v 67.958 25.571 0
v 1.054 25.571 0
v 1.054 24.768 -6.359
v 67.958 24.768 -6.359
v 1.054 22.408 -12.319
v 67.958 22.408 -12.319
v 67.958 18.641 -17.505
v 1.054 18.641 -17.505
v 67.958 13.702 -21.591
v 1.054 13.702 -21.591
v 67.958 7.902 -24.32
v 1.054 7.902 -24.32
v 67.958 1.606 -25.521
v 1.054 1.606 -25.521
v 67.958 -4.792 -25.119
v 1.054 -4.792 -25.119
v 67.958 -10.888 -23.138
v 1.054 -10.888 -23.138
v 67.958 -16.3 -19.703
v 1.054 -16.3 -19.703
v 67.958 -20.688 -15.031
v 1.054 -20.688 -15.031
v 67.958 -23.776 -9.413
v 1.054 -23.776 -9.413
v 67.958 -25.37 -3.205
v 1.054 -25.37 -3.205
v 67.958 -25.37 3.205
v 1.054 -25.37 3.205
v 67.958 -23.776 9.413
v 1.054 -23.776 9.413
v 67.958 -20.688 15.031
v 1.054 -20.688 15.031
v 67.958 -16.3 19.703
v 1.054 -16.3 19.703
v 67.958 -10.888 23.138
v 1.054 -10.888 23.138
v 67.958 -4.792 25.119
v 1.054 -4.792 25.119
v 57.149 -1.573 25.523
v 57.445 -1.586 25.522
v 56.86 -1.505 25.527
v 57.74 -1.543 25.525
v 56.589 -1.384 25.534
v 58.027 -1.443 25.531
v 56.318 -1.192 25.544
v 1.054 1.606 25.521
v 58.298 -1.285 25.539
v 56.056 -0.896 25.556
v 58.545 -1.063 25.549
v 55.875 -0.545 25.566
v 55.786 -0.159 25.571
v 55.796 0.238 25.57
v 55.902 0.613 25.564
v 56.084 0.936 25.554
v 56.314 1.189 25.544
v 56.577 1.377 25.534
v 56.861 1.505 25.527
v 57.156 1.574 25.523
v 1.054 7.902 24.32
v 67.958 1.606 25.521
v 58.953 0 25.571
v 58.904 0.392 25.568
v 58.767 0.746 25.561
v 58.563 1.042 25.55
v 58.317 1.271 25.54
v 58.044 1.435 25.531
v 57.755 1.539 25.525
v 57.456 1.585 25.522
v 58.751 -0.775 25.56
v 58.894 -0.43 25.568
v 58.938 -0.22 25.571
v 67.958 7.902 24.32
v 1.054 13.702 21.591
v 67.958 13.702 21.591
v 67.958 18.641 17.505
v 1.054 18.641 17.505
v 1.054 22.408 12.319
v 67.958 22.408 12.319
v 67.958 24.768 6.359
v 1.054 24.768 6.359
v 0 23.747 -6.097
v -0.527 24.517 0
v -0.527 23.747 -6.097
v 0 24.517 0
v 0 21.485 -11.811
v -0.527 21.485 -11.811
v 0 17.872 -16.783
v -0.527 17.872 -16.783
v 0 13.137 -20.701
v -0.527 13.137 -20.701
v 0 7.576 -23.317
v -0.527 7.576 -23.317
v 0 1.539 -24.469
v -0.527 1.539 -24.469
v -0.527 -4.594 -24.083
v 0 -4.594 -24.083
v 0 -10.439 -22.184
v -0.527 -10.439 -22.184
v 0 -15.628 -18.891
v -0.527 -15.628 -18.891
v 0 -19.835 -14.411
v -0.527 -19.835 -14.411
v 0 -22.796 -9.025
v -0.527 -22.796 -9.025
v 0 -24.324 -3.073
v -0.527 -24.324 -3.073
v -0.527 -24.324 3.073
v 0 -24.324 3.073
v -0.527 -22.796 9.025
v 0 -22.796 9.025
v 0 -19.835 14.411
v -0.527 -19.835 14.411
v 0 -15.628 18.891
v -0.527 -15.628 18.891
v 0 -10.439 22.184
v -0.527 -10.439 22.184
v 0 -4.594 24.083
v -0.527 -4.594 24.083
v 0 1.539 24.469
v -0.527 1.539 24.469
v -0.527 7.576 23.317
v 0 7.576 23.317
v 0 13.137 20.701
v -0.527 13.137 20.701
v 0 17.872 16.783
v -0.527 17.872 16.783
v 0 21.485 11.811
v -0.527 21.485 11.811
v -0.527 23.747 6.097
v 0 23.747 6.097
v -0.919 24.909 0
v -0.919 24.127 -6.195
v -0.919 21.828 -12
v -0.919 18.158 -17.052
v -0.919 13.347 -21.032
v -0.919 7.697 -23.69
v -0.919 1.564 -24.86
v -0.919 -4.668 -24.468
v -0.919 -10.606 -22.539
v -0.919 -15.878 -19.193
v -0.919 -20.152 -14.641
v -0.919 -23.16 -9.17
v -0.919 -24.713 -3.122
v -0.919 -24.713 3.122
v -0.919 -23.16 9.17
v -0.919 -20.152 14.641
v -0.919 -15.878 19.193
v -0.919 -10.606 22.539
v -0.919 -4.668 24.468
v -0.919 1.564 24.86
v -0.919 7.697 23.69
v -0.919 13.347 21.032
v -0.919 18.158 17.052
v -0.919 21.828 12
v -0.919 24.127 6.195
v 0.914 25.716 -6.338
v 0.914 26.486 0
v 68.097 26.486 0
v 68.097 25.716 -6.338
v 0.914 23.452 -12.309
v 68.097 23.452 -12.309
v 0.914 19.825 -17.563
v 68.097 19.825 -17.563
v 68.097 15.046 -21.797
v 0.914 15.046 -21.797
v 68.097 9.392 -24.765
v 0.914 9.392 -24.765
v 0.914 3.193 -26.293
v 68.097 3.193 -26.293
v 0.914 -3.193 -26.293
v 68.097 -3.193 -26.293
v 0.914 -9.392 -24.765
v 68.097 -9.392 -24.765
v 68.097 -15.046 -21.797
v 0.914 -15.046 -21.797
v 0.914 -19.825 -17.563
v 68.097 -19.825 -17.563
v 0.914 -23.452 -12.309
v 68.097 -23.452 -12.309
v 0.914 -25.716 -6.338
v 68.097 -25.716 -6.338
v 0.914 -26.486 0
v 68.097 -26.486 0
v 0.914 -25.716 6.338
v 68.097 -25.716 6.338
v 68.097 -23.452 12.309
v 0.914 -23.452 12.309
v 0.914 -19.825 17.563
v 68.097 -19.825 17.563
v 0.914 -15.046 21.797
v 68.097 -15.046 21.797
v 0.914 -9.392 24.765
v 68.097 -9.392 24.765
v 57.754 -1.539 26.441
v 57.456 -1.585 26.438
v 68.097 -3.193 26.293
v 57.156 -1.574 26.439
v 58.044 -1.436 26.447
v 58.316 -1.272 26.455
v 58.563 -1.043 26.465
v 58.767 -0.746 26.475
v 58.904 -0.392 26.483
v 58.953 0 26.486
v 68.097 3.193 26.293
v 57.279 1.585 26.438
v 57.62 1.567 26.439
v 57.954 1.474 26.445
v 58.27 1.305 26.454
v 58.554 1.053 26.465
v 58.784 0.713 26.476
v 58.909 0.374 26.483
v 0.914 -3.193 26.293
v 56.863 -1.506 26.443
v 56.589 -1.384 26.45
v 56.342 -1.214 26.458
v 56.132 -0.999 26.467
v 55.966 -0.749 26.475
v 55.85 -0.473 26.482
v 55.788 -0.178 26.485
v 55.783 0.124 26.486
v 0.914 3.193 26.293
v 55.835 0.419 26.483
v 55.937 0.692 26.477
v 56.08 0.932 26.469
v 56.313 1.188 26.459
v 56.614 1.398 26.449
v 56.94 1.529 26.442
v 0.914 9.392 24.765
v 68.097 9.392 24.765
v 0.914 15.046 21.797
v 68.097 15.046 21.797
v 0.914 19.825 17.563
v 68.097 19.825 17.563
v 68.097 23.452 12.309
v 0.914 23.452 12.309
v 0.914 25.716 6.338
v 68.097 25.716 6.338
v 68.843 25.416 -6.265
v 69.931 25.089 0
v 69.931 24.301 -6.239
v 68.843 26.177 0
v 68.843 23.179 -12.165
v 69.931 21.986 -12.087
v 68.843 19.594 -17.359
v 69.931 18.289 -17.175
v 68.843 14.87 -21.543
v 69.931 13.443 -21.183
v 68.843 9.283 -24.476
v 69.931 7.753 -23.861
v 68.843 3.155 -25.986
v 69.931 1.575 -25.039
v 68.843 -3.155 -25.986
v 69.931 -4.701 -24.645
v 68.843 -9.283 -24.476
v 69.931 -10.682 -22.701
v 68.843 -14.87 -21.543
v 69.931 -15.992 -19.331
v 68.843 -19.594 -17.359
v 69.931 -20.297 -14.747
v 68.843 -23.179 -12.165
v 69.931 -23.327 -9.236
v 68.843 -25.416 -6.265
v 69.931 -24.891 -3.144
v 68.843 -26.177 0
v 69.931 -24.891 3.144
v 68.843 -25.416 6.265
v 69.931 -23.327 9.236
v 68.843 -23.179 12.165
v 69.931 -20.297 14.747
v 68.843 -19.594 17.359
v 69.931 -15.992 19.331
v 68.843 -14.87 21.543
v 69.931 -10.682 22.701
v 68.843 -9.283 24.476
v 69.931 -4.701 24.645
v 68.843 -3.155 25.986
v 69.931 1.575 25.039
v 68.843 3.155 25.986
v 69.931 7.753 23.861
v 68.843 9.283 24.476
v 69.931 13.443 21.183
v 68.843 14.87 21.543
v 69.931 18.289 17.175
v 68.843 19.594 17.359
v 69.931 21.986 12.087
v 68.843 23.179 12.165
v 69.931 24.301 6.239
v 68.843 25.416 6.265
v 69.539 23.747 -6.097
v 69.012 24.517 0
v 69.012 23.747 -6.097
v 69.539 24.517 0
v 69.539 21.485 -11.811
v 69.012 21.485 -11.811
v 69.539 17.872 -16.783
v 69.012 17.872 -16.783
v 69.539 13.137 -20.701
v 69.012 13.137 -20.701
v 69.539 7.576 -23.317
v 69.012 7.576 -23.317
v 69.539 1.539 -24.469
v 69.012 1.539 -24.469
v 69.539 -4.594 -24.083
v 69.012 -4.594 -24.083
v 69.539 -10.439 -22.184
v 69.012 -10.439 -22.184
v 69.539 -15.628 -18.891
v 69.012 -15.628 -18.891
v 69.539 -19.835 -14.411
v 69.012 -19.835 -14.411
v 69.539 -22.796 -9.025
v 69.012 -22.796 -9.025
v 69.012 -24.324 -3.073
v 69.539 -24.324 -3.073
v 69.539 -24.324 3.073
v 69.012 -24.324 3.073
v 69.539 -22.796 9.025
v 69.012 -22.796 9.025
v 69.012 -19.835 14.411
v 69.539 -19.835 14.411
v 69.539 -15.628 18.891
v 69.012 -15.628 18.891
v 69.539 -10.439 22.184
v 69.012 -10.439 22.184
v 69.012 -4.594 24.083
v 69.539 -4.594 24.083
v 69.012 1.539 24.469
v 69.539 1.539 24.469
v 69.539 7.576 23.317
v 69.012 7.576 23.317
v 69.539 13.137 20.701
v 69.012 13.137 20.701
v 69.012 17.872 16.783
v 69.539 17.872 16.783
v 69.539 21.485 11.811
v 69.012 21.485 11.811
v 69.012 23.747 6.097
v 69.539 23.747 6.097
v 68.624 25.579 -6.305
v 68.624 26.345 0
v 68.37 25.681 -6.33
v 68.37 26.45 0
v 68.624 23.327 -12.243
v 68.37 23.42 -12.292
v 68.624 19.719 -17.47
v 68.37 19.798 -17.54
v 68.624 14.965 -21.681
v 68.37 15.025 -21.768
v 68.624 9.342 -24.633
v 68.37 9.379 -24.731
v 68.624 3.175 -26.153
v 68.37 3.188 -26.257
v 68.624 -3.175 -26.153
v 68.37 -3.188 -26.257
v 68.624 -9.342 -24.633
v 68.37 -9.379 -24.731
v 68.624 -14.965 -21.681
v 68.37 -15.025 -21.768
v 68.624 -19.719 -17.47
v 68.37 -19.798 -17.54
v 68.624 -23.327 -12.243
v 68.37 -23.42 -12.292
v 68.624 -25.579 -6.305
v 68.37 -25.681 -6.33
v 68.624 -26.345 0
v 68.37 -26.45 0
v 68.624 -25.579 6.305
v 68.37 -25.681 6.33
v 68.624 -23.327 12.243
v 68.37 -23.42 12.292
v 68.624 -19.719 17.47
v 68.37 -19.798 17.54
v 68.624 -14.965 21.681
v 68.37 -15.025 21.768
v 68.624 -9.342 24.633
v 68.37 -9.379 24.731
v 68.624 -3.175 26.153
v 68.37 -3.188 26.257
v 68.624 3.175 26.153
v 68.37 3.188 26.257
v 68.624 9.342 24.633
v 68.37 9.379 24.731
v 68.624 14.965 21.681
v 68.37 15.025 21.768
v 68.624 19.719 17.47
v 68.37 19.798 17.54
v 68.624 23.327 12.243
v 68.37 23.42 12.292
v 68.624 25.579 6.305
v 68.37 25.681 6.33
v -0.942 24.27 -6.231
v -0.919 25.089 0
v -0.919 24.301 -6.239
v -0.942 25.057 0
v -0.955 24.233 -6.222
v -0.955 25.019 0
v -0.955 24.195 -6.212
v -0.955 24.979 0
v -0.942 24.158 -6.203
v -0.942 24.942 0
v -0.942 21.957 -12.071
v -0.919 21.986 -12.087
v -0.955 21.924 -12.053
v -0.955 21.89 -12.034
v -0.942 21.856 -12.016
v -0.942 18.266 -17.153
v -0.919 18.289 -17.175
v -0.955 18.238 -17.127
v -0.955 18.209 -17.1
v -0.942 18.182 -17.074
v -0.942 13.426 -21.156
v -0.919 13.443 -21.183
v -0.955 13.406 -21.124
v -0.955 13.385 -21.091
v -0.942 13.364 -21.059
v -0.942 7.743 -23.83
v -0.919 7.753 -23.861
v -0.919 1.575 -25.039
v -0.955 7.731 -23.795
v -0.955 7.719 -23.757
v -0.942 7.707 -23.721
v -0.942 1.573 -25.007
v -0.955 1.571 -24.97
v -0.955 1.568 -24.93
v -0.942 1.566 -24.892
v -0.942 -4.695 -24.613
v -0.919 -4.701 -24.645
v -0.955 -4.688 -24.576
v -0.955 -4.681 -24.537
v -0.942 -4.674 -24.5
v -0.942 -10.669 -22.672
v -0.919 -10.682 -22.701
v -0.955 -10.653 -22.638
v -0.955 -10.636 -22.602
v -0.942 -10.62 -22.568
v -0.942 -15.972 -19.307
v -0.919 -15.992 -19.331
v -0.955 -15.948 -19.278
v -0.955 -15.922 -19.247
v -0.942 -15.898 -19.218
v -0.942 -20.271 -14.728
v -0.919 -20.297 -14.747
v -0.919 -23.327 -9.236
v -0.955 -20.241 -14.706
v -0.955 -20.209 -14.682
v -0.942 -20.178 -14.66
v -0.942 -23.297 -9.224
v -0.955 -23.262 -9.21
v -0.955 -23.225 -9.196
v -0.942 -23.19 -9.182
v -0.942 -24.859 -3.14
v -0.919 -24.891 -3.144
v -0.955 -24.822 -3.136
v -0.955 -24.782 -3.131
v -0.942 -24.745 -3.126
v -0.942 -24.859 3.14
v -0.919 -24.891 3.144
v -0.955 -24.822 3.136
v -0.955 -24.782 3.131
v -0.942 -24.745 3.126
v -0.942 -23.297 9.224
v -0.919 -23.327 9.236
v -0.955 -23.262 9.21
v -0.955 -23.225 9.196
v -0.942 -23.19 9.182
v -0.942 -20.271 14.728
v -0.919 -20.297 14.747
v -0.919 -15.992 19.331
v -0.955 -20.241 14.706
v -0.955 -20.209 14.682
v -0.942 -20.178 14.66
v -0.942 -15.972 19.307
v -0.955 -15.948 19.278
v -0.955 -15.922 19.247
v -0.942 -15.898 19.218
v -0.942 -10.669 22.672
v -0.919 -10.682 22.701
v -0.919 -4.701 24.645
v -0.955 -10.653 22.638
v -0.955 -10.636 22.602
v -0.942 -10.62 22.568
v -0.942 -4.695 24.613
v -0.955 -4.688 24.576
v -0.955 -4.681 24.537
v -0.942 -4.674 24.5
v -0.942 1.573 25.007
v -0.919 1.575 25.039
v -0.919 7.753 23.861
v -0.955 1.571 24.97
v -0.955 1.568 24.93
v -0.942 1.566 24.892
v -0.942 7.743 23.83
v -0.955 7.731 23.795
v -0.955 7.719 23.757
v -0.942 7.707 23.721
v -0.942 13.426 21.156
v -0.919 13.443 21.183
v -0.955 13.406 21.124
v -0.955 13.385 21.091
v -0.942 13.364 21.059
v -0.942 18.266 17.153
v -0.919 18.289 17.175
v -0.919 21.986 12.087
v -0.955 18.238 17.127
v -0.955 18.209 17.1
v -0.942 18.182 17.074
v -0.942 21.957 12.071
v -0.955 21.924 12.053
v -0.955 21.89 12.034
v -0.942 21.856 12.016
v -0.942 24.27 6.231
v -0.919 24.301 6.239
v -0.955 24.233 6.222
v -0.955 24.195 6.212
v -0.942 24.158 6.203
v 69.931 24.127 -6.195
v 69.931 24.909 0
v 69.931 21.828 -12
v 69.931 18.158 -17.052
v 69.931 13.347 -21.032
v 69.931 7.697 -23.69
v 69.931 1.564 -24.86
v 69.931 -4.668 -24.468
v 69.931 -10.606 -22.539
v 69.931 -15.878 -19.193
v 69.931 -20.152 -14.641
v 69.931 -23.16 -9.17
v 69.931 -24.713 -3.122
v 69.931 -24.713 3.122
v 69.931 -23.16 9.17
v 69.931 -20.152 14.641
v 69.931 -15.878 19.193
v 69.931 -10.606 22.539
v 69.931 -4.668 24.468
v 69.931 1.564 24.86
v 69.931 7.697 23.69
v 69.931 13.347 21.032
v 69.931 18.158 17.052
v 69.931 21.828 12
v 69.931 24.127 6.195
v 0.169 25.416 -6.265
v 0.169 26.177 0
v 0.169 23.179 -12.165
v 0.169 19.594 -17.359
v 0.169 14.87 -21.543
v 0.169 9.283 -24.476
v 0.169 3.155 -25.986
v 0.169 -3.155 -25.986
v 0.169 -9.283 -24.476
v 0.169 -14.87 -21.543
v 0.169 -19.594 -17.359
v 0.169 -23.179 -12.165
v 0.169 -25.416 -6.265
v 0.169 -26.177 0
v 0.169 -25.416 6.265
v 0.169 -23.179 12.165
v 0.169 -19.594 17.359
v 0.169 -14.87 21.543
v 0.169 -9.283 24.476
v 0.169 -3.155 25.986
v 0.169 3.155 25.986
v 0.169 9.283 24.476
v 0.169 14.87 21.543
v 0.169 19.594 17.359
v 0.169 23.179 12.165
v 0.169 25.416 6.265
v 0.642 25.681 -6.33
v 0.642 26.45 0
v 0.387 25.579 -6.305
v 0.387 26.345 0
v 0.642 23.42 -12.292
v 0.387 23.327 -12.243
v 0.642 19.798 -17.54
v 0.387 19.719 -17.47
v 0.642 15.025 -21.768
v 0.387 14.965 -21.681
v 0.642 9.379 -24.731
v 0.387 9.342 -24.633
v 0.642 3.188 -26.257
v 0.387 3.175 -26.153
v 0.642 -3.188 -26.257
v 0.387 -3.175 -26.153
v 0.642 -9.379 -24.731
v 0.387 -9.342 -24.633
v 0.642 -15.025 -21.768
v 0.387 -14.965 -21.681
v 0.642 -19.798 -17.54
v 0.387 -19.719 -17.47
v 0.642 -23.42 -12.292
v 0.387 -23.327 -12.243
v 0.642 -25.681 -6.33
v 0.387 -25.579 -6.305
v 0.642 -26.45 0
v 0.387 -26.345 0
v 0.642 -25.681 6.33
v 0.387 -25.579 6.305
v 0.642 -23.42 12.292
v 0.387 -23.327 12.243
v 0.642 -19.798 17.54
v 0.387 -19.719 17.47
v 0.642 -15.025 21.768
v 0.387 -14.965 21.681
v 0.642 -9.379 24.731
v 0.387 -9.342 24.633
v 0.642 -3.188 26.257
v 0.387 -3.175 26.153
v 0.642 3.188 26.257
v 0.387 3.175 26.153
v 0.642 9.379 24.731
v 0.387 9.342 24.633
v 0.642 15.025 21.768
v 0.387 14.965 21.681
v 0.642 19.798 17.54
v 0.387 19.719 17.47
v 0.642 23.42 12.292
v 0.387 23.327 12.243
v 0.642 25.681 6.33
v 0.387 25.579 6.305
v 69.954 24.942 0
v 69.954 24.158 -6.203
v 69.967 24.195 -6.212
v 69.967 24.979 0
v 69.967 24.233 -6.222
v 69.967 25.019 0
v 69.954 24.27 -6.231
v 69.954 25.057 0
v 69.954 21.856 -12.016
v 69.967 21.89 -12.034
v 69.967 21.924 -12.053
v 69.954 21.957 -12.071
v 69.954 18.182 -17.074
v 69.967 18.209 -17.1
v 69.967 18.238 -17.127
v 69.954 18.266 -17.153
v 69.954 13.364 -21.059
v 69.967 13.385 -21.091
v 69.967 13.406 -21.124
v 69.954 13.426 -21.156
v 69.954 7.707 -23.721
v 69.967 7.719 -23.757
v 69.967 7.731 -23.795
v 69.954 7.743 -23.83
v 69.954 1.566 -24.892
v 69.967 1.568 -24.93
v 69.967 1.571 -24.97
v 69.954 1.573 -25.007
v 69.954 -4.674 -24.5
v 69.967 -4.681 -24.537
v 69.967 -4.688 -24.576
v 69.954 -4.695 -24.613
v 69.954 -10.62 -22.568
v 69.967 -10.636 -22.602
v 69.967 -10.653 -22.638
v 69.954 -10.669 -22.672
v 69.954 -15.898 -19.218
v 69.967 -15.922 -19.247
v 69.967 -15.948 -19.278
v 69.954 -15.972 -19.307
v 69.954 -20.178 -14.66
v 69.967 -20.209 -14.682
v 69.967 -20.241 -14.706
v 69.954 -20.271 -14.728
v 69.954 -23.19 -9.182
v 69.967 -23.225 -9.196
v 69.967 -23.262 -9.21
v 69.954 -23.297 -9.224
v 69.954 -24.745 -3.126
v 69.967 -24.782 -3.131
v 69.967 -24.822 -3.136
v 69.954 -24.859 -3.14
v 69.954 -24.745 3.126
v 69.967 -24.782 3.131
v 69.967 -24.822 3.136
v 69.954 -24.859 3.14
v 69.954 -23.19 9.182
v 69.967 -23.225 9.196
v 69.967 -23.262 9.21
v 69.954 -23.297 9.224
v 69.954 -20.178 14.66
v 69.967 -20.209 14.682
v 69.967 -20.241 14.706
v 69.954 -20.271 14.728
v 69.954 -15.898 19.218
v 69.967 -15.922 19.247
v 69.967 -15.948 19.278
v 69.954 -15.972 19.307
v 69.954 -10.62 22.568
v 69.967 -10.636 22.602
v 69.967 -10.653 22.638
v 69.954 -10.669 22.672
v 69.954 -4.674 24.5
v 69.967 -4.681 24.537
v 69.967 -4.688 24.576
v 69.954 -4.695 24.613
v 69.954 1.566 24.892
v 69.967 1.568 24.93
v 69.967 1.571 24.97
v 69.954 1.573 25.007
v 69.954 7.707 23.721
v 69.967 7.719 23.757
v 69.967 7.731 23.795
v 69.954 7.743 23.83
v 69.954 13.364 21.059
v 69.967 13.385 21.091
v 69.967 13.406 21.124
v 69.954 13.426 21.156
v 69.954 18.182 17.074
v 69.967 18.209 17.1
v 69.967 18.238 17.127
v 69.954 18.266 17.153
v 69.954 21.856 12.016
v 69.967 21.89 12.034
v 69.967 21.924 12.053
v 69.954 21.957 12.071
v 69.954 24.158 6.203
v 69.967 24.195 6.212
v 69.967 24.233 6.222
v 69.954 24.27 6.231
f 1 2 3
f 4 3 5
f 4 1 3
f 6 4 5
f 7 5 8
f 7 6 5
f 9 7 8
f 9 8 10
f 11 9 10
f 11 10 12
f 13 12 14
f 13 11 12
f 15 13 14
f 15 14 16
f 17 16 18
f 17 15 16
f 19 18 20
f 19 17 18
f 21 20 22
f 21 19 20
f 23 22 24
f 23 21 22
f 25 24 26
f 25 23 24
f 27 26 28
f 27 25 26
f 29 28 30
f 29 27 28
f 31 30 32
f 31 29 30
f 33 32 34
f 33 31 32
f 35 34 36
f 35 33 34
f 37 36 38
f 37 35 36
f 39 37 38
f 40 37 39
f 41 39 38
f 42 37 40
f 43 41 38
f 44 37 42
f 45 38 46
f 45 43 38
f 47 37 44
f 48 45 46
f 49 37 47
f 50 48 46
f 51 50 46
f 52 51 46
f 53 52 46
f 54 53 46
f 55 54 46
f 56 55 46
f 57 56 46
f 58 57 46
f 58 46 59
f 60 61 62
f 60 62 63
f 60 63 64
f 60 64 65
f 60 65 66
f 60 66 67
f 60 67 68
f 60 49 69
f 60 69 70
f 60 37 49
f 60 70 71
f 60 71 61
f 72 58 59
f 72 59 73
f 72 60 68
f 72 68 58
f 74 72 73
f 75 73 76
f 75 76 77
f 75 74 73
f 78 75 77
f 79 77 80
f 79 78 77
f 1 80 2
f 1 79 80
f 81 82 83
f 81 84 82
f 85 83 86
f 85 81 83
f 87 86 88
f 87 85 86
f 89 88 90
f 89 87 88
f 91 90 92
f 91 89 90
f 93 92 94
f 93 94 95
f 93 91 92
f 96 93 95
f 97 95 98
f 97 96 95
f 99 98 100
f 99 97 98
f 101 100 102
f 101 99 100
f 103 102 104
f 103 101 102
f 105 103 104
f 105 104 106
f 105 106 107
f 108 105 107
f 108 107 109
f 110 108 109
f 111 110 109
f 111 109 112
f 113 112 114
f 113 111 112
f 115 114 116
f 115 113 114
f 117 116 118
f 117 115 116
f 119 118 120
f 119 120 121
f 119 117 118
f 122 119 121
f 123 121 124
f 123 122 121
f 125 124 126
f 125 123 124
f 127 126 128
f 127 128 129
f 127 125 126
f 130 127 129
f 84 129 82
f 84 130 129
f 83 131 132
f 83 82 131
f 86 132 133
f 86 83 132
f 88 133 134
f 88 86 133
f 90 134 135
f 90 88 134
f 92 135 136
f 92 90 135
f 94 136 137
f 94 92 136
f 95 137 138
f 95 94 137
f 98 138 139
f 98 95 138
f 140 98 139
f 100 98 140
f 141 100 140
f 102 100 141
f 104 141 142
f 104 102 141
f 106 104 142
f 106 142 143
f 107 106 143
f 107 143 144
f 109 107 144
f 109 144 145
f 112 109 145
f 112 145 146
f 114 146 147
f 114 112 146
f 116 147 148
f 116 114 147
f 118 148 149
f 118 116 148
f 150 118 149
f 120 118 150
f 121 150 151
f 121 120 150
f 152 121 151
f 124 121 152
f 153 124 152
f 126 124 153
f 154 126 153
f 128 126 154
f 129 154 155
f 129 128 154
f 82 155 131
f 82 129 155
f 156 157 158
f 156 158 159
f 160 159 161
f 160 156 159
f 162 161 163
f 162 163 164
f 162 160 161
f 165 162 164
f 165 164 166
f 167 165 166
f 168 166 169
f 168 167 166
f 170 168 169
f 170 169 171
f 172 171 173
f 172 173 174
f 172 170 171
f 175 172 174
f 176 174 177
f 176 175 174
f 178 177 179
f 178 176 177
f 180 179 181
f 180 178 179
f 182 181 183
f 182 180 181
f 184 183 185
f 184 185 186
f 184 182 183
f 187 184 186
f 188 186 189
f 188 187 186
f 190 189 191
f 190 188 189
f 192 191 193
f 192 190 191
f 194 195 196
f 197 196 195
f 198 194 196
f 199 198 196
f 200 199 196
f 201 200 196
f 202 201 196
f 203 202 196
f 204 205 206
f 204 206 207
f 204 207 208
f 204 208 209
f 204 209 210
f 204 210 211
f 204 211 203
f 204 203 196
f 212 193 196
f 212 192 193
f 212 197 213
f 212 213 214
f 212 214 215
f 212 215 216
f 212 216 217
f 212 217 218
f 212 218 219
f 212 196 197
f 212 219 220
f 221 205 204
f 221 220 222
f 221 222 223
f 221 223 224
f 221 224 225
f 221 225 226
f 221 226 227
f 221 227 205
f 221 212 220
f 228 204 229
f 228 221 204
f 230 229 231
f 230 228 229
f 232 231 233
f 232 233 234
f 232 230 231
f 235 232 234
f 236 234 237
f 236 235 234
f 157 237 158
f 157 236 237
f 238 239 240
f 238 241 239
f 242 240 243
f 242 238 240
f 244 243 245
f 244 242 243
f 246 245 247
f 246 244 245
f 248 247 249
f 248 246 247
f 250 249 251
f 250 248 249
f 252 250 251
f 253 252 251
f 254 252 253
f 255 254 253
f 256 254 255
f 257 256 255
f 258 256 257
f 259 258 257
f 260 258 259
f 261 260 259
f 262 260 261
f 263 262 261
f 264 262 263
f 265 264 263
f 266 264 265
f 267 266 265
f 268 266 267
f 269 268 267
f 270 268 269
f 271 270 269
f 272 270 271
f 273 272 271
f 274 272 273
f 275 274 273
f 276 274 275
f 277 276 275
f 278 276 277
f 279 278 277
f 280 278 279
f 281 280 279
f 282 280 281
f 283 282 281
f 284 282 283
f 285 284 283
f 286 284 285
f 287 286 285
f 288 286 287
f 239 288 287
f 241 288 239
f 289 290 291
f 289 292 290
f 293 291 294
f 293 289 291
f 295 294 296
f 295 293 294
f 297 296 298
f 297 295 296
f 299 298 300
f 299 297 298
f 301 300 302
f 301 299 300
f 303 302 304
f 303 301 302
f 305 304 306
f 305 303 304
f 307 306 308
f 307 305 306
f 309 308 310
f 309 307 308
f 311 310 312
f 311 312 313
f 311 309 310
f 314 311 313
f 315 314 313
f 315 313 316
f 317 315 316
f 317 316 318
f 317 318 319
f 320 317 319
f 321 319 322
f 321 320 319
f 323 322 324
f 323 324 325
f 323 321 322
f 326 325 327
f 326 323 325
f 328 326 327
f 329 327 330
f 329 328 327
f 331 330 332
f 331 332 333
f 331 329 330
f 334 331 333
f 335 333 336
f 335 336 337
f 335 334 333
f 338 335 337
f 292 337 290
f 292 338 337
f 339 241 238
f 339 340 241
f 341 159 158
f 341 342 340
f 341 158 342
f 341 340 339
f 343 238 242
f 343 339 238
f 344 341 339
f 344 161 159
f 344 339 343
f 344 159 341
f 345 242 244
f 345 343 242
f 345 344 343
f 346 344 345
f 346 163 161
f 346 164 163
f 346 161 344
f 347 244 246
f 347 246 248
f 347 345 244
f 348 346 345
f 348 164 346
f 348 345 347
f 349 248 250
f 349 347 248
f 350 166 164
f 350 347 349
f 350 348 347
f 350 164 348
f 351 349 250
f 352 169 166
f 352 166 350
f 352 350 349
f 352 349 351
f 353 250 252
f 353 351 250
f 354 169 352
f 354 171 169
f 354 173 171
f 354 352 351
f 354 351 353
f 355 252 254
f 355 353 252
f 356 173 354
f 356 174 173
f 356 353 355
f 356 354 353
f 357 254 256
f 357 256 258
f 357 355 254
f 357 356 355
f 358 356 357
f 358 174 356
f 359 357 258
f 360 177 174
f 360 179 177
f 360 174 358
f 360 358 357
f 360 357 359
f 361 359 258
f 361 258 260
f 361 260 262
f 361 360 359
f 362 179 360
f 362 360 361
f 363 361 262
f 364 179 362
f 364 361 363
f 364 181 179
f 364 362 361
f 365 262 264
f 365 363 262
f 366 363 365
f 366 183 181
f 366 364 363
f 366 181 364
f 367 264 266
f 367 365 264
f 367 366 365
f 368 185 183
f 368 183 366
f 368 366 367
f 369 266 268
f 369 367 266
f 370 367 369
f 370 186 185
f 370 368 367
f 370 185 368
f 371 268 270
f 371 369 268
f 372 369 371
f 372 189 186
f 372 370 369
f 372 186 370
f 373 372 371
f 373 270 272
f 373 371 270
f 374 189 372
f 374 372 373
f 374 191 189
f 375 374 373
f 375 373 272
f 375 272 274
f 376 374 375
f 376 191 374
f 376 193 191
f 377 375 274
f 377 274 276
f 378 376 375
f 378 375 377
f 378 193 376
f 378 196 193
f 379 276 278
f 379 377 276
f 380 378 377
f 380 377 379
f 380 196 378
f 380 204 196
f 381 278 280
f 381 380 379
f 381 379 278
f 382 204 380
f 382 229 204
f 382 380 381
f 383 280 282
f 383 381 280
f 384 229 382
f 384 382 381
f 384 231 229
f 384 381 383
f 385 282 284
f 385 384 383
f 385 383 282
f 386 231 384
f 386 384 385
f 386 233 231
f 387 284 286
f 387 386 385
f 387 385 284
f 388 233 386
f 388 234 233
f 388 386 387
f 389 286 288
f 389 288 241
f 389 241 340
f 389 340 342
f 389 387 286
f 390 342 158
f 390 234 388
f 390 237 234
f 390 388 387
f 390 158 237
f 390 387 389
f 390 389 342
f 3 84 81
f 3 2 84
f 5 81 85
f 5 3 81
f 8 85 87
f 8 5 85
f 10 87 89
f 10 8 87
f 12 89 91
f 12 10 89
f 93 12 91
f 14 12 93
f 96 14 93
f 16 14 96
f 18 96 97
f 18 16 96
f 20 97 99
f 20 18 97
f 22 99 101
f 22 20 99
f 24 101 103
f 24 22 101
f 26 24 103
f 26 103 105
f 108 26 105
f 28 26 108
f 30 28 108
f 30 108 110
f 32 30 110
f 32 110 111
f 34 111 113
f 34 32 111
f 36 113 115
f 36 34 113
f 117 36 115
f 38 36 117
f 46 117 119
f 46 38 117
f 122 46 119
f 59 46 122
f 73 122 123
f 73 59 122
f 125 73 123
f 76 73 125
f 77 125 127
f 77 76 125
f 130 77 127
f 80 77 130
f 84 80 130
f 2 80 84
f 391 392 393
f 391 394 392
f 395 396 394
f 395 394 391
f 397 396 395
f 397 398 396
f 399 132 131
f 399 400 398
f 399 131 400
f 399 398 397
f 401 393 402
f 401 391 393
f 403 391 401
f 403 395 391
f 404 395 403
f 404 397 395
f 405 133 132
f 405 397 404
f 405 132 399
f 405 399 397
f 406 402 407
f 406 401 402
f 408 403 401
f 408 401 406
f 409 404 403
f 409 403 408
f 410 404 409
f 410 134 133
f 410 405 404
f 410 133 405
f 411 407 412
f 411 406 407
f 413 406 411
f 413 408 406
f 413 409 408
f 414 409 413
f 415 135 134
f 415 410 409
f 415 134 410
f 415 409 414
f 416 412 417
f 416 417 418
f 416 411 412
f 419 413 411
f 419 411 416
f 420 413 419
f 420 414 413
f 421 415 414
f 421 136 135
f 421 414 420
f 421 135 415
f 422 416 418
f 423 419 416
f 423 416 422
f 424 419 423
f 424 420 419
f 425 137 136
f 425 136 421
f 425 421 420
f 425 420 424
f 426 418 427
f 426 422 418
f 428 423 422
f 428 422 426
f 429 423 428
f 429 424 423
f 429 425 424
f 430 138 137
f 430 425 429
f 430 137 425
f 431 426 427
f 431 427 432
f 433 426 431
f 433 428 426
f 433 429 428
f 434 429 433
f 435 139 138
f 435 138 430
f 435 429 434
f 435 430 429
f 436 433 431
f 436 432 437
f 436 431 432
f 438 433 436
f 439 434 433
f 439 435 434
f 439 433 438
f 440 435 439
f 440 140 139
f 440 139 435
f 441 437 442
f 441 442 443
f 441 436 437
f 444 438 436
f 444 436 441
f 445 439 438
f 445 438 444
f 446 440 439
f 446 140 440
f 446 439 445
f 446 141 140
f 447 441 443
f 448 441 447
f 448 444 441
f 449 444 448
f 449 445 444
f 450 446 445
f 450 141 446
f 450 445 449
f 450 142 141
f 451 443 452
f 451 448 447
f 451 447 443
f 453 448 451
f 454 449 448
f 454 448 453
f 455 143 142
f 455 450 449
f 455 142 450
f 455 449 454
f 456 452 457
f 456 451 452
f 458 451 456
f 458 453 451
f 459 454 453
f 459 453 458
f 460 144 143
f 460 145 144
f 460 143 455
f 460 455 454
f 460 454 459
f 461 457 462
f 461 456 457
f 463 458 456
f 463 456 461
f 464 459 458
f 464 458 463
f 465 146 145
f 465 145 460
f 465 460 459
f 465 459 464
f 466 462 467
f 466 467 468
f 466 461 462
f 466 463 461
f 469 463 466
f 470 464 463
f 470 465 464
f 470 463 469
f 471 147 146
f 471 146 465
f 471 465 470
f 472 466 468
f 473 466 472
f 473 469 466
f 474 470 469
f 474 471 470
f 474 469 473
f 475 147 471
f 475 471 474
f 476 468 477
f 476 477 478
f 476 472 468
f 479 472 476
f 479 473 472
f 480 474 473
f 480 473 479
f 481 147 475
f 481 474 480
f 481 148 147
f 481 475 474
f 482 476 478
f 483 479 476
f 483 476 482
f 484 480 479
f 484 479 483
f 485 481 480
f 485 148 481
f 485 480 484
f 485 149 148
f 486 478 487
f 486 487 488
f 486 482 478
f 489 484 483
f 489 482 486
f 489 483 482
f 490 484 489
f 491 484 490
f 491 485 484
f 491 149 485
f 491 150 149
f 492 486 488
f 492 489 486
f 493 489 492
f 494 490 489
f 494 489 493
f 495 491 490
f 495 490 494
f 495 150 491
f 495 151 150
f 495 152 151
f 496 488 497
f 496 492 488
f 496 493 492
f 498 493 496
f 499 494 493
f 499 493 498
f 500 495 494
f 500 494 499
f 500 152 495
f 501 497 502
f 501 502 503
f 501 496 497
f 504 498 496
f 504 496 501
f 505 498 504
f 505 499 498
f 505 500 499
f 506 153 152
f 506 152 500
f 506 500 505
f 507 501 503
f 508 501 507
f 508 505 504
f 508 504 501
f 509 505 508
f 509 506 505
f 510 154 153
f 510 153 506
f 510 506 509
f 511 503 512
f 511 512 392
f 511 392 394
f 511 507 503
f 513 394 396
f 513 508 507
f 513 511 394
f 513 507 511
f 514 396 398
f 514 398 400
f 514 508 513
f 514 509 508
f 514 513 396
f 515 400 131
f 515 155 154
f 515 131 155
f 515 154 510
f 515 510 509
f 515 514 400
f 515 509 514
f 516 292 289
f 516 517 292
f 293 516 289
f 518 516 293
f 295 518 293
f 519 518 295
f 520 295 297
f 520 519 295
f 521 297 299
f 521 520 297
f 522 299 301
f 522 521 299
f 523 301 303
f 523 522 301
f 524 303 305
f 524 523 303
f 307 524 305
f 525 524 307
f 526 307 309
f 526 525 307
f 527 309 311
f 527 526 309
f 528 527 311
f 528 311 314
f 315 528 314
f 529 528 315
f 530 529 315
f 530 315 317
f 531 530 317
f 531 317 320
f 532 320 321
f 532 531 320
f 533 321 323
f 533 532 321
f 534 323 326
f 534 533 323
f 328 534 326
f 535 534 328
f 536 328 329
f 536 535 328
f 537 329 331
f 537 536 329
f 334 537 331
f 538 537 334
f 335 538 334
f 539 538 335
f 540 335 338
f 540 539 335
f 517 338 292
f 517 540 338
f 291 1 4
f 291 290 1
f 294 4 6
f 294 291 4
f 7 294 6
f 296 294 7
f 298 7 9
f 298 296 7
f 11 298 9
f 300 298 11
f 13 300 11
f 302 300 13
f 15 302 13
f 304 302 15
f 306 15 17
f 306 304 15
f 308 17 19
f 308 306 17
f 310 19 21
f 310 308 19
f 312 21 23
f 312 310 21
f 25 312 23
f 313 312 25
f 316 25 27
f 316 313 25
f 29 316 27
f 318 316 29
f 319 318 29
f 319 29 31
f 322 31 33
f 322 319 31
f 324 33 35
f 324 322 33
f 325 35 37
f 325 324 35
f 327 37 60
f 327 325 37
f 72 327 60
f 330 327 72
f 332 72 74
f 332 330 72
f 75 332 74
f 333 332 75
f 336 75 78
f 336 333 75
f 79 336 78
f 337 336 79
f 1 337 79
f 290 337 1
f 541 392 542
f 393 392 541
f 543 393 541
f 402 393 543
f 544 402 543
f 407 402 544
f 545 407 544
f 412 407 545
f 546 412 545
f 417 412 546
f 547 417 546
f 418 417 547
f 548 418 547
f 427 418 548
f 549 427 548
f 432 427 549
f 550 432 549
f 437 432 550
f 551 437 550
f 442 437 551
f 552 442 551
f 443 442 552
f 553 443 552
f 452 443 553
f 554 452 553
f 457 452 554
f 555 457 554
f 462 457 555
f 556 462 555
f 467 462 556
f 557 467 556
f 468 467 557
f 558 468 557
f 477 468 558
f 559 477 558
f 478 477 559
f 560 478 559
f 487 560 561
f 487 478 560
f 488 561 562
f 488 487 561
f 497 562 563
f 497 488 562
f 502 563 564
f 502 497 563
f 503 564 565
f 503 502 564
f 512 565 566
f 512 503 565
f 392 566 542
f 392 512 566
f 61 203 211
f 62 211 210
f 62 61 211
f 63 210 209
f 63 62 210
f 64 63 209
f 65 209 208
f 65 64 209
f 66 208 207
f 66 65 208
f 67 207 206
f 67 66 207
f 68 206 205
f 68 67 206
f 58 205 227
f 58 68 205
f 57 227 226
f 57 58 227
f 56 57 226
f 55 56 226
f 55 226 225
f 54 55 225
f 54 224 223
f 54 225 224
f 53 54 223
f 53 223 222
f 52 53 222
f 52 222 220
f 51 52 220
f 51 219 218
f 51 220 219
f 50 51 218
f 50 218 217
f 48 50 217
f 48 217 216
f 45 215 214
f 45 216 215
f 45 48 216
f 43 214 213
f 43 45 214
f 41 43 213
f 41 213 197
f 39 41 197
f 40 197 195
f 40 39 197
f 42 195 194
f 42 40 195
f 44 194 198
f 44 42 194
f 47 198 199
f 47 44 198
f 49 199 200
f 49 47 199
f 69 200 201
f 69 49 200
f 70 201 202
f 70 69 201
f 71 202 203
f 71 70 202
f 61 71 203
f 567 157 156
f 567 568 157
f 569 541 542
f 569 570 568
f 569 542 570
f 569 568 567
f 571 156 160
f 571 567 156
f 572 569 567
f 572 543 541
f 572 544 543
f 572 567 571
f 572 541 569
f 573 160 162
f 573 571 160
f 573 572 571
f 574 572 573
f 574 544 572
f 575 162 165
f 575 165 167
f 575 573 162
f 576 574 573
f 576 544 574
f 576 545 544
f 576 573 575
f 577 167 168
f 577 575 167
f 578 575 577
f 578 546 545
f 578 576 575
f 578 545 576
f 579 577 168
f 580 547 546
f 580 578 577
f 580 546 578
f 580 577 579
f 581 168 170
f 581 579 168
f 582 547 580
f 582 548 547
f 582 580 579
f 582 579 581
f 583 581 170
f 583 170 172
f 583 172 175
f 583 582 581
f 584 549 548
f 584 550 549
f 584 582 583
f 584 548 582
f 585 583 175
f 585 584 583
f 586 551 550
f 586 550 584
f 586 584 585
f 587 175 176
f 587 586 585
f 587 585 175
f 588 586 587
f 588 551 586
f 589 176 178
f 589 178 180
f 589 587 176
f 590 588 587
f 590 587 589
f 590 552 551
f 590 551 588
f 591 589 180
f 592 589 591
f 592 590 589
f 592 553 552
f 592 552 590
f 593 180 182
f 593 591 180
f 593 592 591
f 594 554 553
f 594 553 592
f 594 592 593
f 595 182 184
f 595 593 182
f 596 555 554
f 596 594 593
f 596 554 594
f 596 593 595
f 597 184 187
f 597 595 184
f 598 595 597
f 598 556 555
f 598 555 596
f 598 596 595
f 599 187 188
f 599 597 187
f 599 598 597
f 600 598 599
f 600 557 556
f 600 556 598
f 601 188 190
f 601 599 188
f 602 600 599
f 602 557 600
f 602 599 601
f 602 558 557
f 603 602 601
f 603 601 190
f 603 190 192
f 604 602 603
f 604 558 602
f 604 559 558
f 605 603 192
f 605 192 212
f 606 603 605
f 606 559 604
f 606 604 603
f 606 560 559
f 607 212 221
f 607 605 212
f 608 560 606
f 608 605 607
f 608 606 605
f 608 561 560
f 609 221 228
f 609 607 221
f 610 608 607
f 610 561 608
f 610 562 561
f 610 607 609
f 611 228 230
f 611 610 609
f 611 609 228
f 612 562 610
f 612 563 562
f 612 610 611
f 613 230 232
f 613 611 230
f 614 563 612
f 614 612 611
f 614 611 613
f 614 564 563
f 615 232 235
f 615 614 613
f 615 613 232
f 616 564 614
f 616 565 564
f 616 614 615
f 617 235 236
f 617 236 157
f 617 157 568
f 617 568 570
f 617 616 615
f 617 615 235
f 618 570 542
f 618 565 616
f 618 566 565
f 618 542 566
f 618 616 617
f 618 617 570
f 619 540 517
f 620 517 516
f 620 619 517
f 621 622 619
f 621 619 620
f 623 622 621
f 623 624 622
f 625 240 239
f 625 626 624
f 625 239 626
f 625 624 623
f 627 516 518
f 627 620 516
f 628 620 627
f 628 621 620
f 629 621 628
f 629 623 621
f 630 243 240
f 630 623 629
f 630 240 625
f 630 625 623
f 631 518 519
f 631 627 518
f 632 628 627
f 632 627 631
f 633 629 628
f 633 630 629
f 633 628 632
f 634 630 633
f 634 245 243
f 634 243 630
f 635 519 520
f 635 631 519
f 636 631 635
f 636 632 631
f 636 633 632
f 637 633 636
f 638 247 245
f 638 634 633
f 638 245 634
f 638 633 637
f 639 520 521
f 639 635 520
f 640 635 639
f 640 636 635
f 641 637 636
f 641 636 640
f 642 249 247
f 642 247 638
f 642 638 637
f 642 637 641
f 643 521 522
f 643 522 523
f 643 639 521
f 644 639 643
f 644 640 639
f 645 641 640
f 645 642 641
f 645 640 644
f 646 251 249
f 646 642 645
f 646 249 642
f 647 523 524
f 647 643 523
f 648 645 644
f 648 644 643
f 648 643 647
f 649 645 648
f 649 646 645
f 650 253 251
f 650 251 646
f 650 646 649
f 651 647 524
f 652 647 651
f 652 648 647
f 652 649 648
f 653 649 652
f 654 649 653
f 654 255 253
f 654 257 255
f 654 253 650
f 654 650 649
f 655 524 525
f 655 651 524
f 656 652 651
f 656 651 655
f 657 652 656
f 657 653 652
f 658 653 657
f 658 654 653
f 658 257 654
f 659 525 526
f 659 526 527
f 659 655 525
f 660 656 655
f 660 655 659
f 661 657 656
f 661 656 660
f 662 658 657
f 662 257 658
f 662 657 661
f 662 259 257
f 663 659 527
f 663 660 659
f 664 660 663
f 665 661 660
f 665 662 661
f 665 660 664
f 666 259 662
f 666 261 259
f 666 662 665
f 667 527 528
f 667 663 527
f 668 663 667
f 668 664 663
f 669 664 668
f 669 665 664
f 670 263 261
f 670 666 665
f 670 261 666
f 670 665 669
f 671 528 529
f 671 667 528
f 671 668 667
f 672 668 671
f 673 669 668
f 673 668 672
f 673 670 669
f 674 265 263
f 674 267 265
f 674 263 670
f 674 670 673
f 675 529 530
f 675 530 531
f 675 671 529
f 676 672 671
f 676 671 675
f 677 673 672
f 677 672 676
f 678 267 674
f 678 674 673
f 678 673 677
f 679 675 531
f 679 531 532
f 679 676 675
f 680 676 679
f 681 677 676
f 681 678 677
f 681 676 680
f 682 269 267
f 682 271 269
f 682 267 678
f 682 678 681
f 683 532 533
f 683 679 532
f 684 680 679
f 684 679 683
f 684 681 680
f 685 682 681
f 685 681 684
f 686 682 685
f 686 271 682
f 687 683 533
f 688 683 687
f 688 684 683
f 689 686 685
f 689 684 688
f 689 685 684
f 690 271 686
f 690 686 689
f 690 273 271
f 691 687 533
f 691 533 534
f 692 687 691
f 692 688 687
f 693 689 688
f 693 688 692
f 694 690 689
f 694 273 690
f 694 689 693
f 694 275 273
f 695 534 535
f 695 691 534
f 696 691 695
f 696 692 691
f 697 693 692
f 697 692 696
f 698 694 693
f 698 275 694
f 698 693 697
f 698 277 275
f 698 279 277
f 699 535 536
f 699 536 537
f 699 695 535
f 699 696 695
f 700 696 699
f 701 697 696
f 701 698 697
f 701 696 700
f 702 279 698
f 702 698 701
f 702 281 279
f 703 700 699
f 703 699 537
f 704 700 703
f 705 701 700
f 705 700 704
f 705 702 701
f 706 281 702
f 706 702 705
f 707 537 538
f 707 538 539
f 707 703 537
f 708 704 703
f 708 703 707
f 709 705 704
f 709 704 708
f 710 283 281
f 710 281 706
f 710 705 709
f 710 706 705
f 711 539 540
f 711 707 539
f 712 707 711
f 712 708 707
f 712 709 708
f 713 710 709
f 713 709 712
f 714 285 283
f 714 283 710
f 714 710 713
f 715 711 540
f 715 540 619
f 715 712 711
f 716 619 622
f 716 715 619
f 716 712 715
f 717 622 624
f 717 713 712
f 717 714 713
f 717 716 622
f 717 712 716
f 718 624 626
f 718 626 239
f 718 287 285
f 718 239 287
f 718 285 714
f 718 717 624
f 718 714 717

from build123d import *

# Parameters (mm, degrees)
SKETCH2_R          = 1.5875
CUT_EXTRUDE1_DEPTH = 26.48585


with BuildPart() as part:
    # Sketch1 → Revolve1 (revolve)
    with BuildSketch(Plane.XY):
        with BuildLine():
            Line((-0.919083697, 24.909383697), (-0.52705, 24.51735))
            Line((-0.52705, 24.51735), (0, 24.51735))
            Line((0, 24.51735), (1.0541, 25.57145))
            Line((1.0541, 25.57145), (67.9577, 25.57145))
            Line((67.9577, 25.57145), (69.0118, 24.51735))
            Line((69.0118, 24.51735), (69.53885, 24.51735))
            Line((69.53885, 24.51735), (69.930883697, 24.909383697))
            ThreePointArc((69.930883697, 24.909383697), (69.968081136, 24.999186258), (69.930883697, 25.088988819))
            Line((69.930883697, 25.088988819), (68.842761258, 26.177111258))
            ThreePointArc((68.842761258, 26.177111258), (68.500786606, 26.405611415), (68.0974, 26.48585))
            Line((68.0974, 26.48585), (0.9144, 26.48585))
            ThreePointArc((0.9144, 26.48585), (0.511013394, 26.405611415), (0.169038742, 26.177111258))
            Line((0.169038742, 26.177111258), (-0.919083697, 25.088988819))
            ThreePointArc((-0.919083697, 25.088988819), (-0.956281136, 24.999186258), (-0.919083697, 24.909383697))
        make_face()
    revolve(axis=Axis((69.0118, 0, 0), (-1, 0, 0)))

    # Sketch2 → Cut-Extrude1 (cut)
    with BuildSketch(Plane.XY):
        with Locations((57.3659, 0)):
            Circle(SKETCH2_R)
    extrude(amount=CUT_EXTRUDE1_DEPTH, mode=Mode.SUBTRACT)


solid = part.part
